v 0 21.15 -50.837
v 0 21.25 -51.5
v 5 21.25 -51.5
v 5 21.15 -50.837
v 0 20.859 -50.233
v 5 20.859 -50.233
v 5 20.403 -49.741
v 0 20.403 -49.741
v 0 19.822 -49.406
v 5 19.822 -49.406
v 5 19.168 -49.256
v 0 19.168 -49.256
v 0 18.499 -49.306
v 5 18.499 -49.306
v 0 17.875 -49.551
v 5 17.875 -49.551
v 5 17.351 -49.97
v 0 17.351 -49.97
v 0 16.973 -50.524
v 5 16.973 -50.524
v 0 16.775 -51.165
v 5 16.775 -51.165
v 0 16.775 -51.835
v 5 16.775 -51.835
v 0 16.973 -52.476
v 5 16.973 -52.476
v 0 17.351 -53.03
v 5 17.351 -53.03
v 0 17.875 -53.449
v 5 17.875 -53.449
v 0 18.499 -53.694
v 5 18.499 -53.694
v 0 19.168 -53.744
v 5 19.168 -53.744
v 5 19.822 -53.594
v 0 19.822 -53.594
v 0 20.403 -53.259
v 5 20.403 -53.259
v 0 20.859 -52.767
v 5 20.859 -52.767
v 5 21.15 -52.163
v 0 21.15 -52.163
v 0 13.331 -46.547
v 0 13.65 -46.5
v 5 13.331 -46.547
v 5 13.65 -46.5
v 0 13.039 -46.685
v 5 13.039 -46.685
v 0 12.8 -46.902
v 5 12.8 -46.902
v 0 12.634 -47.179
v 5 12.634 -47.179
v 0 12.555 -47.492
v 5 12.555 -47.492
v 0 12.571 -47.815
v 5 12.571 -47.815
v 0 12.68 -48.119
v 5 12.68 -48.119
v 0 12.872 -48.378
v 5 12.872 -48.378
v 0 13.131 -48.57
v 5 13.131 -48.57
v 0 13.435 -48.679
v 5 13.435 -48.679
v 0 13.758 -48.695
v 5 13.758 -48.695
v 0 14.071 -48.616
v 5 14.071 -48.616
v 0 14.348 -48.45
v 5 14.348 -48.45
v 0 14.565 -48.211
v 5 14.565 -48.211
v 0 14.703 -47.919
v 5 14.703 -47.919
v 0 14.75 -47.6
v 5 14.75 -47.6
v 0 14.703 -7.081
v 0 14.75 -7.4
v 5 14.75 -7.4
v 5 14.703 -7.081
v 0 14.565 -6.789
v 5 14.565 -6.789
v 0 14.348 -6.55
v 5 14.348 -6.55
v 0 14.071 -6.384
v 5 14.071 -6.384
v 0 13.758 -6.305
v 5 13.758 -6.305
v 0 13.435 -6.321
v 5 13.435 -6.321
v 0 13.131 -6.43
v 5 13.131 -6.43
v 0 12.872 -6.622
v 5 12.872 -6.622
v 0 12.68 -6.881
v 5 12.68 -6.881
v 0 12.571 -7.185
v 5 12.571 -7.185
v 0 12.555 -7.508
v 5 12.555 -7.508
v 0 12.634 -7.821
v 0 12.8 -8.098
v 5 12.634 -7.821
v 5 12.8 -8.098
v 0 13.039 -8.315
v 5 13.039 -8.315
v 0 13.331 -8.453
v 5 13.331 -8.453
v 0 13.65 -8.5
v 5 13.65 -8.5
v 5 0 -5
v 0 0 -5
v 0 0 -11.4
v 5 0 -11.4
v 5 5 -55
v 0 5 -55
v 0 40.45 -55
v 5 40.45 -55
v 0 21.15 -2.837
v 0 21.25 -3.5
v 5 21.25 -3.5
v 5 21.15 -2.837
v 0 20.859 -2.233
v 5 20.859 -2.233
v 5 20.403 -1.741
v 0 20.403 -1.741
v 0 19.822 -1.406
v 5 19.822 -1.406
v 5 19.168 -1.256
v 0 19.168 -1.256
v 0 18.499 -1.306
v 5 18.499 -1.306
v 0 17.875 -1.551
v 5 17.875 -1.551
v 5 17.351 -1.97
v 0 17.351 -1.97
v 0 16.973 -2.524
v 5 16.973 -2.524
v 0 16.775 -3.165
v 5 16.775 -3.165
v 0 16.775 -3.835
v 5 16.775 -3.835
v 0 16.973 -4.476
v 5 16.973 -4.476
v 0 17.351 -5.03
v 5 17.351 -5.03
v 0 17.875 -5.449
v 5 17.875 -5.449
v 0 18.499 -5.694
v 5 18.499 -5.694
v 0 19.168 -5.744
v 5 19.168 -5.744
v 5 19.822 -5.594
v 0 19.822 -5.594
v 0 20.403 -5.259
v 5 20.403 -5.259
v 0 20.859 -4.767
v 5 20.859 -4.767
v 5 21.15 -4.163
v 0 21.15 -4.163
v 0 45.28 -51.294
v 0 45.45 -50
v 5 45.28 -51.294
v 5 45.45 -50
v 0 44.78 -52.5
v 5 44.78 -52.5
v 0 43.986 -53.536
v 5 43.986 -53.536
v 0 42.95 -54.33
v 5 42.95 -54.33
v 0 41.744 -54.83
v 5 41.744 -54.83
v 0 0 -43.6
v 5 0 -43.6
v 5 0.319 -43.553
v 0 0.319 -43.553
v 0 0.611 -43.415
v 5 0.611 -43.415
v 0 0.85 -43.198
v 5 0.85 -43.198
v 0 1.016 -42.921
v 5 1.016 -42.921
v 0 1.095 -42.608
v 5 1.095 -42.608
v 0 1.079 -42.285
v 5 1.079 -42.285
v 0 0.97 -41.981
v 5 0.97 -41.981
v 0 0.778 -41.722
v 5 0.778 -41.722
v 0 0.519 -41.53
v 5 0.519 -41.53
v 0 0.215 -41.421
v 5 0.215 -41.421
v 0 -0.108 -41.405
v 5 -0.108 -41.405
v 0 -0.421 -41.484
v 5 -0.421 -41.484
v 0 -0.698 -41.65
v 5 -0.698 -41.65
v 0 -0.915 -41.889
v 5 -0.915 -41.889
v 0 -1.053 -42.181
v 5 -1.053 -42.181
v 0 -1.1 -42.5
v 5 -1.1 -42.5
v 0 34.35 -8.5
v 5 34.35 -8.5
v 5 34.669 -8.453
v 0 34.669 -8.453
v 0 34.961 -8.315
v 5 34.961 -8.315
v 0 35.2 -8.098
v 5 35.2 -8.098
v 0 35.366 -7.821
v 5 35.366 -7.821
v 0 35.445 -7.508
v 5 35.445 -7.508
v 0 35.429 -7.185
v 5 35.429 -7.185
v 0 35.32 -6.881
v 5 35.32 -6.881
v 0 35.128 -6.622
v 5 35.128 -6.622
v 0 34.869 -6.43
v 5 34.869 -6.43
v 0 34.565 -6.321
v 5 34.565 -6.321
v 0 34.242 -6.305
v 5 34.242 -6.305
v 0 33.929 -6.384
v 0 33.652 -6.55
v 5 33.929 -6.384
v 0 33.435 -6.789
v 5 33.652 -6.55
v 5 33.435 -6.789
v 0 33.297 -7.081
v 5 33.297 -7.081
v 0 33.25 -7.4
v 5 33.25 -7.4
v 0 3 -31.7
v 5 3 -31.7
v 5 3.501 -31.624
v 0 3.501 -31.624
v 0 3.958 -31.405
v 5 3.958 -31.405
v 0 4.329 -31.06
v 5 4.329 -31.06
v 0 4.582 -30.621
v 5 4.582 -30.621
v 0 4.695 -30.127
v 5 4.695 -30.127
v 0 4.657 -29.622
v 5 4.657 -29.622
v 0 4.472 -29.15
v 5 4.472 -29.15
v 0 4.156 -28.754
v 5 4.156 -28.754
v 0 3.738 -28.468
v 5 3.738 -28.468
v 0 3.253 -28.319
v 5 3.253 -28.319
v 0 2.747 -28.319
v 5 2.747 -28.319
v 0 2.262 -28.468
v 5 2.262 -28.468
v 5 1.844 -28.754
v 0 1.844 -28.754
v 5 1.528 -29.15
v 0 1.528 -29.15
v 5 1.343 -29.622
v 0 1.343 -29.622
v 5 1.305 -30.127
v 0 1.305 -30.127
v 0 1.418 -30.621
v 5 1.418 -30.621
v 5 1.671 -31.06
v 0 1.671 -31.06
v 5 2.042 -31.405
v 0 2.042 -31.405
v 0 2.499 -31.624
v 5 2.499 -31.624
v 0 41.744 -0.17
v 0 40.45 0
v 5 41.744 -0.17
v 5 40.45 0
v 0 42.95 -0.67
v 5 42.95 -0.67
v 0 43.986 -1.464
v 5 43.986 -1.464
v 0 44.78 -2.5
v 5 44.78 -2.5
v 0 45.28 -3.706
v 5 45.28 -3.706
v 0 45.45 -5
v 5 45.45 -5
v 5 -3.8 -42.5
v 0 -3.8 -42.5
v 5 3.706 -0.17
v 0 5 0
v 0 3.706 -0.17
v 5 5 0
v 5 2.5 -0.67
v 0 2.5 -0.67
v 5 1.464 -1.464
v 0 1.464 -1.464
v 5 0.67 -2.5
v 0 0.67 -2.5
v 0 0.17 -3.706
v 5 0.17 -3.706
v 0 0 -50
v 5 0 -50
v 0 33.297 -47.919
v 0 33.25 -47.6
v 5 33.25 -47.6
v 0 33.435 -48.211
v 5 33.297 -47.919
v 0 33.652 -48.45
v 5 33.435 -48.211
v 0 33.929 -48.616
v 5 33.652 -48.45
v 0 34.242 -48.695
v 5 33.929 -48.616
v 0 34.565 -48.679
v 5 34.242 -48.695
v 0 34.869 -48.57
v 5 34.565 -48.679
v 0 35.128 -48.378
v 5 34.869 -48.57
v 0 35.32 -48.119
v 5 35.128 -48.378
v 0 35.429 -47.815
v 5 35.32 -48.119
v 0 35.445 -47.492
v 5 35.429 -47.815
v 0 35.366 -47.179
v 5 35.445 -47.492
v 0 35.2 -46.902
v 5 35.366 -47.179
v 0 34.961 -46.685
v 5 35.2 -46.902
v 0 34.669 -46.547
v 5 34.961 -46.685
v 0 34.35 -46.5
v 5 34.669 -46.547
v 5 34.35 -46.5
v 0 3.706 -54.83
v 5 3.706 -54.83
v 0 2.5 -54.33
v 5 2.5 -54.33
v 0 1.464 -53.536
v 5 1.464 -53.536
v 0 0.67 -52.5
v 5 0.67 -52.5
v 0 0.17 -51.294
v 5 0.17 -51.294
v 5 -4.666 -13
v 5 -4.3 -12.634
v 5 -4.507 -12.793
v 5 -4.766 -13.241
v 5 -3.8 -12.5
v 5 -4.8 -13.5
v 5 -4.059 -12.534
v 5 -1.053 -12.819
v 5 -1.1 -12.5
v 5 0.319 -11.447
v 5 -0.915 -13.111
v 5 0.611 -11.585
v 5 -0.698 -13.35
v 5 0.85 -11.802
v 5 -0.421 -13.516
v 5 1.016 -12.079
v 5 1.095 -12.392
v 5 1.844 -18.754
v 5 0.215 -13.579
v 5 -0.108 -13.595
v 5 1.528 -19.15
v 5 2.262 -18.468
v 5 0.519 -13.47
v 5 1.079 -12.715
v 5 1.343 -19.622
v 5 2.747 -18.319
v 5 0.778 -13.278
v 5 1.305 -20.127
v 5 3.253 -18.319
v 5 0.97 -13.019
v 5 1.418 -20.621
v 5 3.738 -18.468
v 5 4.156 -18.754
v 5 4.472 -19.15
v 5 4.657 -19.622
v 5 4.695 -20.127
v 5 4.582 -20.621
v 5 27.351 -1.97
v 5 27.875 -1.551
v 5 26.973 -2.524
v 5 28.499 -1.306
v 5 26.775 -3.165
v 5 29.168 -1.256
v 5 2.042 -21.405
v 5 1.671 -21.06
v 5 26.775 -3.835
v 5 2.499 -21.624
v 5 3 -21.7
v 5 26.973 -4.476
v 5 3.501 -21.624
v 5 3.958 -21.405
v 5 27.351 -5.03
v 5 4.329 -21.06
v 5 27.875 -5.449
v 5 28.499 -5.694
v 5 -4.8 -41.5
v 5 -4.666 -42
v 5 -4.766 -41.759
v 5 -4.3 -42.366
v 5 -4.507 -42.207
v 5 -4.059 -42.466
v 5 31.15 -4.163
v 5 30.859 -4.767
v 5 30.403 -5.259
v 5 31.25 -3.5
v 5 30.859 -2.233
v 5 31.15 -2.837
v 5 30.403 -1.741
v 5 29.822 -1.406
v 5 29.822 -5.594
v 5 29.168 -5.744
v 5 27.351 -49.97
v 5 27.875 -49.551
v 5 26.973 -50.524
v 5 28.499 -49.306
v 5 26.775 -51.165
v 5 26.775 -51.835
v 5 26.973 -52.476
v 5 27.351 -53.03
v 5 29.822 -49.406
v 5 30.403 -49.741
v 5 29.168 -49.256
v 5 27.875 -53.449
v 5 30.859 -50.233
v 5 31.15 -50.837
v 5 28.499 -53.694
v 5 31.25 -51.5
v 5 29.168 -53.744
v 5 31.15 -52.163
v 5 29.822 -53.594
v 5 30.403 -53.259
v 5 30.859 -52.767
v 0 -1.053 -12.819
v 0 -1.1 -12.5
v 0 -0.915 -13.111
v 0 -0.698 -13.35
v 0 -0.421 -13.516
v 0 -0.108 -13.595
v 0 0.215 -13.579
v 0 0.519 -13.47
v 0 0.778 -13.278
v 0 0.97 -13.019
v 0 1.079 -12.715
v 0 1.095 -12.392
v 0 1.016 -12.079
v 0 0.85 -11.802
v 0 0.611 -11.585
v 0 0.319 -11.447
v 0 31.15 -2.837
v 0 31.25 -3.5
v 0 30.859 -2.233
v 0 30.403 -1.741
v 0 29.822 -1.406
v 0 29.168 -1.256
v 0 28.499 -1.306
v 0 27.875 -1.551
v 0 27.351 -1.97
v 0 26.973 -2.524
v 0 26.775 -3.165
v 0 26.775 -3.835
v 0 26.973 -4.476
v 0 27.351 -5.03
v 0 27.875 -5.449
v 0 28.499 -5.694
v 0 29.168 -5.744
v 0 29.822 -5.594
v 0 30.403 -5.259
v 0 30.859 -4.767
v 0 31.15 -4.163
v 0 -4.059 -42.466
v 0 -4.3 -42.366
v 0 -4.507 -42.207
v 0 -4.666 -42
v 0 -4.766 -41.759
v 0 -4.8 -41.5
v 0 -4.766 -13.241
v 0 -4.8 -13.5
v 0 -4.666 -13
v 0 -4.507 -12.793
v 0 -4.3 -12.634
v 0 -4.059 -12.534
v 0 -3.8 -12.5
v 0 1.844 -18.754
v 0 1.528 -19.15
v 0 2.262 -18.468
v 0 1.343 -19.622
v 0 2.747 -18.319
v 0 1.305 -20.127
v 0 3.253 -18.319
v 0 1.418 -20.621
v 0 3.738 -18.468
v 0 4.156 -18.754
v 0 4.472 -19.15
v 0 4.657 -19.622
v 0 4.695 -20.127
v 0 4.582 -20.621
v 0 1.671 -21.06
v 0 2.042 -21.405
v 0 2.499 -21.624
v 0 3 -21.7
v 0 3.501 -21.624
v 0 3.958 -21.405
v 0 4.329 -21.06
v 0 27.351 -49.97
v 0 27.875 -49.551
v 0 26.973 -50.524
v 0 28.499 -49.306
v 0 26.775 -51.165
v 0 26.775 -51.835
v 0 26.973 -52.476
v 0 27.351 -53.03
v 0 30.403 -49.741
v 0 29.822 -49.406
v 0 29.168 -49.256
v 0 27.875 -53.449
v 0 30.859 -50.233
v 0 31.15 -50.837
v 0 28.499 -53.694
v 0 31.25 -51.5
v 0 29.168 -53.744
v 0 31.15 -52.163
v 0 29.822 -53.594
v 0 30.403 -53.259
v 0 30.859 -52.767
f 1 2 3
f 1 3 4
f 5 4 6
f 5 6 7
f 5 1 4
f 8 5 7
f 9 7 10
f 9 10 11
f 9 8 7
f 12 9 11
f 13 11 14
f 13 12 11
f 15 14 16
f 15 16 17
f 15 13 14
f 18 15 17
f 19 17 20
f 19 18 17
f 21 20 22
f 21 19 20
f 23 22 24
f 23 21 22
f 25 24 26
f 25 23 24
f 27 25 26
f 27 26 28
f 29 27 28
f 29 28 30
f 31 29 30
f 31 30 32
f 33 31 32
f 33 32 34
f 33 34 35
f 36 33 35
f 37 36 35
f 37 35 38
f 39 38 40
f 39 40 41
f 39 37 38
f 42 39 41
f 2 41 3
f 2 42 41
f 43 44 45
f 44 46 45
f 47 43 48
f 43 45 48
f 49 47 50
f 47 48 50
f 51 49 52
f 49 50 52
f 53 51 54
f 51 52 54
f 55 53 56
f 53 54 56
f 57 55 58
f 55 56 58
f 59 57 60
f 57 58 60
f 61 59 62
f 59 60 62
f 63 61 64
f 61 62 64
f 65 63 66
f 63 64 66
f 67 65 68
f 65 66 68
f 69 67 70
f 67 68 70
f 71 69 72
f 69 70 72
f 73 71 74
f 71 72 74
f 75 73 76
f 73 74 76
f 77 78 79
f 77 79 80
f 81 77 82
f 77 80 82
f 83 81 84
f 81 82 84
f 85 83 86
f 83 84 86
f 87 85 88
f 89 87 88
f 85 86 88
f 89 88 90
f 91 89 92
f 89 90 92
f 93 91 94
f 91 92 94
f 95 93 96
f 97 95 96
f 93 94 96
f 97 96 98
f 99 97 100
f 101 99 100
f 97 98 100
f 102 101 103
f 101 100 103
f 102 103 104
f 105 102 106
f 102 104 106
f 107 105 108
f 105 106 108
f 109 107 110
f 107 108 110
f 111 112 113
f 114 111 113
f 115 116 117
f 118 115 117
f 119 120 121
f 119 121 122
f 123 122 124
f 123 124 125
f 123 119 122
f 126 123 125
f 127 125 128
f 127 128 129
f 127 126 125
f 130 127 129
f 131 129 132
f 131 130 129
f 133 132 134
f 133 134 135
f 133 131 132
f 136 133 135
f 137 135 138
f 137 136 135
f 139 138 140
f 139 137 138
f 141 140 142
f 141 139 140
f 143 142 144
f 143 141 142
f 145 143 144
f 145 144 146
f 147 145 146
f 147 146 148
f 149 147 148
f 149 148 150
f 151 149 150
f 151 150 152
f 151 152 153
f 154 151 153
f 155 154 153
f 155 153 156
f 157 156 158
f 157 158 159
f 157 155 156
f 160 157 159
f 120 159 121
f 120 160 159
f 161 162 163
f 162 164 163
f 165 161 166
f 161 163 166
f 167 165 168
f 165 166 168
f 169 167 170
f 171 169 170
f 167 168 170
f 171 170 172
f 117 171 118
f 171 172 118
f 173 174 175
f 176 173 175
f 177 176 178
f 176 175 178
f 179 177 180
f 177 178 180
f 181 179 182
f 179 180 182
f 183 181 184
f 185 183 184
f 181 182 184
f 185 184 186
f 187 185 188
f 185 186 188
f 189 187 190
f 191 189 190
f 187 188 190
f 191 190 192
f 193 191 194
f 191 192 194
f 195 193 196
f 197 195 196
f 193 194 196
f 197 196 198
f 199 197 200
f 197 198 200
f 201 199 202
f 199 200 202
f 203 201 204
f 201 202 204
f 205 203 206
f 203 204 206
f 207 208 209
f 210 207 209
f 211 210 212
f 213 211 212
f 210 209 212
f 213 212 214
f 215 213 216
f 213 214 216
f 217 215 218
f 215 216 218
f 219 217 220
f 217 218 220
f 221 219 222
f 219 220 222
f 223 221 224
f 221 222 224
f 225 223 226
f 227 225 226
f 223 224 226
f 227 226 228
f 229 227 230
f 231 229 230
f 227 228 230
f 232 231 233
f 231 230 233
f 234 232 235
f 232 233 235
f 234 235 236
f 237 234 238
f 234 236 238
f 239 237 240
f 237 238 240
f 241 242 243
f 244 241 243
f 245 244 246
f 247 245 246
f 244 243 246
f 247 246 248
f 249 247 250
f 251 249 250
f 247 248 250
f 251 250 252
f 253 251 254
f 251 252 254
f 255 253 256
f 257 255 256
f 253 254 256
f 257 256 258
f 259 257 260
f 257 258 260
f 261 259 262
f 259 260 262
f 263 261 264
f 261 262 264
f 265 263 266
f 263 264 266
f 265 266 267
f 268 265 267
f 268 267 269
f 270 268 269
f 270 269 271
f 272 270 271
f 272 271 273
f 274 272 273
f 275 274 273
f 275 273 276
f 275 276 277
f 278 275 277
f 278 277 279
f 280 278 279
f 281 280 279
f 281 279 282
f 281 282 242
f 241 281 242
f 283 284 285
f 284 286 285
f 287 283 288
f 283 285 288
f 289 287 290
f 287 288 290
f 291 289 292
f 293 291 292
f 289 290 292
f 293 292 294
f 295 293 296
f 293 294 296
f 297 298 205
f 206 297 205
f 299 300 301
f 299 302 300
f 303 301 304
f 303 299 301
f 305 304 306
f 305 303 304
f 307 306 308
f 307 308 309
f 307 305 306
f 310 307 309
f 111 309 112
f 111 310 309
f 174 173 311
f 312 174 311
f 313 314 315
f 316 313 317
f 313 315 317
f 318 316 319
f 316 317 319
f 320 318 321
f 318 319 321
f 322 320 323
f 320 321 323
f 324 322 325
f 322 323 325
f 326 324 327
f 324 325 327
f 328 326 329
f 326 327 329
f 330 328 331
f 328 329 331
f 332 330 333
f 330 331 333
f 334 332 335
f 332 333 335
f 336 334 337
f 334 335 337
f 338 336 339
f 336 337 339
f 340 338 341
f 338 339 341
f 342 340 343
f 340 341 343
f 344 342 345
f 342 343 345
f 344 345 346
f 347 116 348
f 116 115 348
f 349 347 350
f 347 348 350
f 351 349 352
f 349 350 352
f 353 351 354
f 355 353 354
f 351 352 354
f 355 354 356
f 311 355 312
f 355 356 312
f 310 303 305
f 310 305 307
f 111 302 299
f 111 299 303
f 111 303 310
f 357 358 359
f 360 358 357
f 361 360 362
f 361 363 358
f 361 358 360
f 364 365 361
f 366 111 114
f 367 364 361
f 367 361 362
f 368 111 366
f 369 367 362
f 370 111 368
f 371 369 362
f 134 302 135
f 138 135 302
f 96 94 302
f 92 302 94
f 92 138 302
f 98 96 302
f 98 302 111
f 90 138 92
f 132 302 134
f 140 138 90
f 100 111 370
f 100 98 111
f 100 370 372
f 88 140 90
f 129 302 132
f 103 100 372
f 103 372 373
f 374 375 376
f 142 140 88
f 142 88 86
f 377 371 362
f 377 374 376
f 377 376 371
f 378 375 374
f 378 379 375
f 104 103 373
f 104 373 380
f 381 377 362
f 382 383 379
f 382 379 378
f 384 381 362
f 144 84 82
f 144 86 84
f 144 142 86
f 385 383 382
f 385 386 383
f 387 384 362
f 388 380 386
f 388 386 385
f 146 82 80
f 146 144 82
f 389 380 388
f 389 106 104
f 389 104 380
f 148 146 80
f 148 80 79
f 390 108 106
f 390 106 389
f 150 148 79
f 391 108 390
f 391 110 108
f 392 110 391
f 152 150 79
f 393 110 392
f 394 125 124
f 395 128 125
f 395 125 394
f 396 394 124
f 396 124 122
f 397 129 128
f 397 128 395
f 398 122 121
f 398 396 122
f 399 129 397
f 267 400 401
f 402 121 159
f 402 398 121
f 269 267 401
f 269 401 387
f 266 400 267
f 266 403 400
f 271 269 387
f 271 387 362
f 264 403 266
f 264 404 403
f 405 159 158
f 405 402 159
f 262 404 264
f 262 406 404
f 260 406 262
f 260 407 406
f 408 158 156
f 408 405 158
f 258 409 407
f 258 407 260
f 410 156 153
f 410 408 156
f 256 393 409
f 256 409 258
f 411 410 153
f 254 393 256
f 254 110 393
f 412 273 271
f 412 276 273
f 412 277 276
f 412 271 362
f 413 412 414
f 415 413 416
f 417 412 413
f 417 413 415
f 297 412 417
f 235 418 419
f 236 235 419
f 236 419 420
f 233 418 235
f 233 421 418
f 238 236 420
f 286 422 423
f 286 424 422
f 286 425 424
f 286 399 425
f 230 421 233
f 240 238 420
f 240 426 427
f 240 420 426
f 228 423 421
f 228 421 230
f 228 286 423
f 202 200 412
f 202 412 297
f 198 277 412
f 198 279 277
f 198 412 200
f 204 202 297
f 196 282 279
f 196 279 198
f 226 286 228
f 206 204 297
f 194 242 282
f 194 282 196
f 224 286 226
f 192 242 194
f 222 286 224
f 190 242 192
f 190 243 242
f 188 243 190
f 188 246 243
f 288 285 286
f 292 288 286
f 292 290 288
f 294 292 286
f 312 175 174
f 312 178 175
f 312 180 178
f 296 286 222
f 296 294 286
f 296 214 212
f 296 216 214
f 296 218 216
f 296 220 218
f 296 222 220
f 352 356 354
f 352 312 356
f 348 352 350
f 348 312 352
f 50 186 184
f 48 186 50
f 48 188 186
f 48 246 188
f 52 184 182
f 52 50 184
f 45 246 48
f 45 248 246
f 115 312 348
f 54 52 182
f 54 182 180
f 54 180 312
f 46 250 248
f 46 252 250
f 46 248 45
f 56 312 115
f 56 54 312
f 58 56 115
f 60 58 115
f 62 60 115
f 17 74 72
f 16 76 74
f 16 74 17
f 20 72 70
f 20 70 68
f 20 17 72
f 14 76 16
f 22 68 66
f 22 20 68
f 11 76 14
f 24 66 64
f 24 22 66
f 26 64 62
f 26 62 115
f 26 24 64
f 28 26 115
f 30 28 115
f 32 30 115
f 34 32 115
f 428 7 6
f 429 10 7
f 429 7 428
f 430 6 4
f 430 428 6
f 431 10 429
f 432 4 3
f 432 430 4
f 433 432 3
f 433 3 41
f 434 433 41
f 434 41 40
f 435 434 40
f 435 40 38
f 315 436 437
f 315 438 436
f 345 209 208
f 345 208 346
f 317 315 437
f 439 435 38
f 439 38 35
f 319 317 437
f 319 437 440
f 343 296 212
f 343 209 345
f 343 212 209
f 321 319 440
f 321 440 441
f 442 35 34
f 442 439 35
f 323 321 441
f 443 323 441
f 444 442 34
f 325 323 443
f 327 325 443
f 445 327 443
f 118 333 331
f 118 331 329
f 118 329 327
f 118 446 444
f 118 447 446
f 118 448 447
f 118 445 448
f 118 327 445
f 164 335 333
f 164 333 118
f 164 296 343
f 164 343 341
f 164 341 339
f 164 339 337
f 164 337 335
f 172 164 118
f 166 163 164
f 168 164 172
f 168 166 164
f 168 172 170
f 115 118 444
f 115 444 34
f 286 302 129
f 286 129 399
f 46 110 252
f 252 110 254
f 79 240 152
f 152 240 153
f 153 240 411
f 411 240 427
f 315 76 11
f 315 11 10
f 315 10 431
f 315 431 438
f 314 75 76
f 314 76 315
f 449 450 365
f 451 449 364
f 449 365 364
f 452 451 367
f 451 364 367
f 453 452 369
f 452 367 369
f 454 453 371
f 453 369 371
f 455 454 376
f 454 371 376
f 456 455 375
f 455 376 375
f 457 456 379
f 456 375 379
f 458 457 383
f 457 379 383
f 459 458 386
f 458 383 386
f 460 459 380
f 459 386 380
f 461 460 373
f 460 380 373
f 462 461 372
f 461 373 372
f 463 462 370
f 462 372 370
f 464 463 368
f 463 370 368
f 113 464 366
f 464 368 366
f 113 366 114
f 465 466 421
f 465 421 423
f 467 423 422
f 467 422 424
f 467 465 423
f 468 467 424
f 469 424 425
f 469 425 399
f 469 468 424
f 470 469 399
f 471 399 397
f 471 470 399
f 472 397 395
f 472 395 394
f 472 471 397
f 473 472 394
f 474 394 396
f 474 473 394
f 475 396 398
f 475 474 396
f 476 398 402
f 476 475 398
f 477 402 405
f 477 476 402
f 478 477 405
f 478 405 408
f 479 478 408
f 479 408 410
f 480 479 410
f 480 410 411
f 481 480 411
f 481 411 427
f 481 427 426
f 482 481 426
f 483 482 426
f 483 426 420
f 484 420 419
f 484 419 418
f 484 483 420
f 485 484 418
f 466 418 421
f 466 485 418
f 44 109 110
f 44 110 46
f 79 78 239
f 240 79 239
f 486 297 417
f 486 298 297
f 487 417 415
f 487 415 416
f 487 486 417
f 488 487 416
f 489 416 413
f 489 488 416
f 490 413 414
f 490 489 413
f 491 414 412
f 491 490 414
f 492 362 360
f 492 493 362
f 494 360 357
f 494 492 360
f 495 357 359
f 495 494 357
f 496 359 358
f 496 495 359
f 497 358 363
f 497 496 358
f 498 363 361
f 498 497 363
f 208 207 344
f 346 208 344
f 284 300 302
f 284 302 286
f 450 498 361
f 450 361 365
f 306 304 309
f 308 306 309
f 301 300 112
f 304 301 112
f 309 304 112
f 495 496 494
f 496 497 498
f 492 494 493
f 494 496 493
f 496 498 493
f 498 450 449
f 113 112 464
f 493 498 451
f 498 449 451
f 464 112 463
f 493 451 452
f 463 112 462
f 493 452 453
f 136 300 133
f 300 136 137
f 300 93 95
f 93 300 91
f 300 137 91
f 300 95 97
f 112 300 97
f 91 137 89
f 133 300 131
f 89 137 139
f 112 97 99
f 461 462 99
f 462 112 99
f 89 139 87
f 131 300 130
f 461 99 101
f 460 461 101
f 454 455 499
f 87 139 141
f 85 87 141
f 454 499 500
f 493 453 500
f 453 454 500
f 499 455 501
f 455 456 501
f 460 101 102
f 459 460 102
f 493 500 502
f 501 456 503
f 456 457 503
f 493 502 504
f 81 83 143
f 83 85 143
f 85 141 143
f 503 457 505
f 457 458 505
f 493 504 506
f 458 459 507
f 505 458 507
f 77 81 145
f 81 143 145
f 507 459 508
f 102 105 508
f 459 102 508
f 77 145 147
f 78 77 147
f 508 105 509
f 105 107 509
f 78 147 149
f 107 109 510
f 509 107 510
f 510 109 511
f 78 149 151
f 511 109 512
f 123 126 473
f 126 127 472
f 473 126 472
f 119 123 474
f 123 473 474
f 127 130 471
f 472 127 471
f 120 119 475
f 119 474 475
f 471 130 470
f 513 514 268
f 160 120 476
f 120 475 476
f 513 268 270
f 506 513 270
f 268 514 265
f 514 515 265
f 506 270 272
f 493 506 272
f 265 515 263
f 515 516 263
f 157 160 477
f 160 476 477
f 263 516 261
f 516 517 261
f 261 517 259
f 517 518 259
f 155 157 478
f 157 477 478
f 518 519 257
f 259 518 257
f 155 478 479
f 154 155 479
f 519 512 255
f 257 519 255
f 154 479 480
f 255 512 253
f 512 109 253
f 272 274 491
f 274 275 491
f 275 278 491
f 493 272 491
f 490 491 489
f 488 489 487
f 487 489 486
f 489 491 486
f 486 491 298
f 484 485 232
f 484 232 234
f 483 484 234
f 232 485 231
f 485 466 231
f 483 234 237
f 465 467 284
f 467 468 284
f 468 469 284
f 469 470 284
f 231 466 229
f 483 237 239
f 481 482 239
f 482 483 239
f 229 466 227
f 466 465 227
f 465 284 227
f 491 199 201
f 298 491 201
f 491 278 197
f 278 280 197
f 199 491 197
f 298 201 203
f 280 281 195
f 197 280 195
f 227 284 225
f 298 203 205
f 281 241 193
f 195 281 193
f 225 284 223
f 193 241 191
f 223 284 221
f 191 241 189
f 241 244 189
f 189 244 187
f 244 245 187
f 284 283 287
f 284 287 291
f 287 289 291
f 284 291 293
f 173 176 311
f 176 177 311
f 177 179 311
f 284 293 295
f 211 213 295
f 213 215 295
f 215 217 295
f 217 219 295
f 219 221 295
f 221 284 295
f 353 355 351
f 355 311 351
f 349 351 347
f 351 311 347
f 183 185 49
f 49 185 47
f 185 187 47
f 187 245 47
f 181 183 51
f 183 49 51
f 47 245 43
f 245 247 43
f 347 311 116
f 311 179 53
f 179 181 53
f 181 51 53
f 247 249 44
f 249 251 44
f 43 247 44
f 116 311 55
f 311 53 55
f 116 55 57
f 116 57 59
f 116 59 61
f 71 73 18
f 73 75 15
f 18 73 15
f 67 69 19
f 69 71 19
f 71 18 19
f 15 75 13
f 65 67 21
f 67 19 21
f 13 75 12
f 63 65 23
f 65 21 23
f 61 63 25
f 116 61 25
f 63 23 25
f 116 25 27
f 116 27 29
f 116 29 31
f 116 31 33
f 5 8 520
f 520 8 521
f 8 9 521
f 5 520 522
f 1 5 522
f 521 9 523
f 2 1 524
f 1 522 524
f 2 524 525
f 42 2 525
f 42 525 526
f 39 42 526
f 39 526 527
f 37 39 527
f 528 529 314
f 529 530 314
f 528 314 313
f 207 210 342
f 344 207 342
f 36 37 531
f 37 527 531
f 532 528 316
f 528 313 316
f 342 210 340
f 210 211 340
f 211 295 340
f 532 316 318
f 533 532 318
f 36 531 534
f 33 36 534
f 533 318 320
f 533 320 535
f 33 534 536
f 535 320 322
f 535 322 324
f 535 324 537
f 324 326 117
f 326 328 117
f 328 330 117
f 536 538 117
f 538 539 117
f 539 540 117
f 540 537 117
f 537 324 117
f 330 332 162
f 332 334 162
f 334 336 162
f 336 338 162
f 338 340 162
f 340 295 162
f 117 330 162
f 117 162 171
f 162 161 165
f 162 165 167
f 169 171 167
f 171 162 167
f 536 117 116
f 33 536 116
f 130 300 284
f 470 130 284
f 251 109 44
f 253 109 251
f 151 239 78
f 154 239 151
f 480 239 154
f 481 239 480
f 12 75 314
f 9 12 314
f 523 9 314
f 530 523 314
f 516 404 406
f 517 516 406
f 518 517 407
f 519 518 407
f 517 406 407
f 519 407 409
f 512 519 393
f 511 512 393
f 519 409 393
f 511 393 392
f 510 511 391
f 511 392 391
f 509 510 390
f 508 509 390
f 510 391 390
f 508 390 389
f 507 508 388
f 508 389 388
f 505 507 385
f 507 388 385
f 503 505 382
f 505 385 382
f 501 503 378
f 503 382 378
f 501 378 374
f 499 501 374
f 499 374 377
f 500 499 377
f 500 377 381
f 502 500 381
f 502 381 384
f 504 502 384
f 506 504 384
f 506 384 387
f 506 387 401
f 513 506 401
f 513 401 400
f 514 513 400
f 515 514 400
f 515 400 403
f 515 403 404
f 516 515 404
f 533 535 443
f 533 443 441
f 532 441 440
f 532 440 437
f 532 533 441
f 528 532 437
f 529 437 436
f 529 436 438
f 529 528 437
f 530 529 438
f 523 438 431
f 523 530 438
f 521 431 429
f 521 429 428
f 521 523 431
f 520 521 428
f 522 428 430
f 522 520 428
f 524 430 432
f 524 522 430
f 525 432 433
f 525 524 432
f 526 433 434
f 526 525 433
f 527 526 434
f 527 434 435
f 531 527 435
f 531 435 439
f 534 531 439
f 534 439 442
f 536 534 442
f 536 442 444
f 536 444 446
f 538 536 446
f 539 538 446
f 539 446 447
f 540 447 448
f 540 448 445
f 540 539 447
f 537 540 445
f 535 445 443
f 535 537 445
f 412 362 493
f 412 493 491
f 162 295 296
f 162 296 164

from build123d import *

# Parameters (mm, degrees)
SKETCH_1_W                   = 55
SKETCH_1_H                   = 45.45
SKETCH_1_W_2                 = 40.2
SKETCH_1_H_2                 = 20.7
EXTRUDE_1_DEPTH              = 5
SKETCH_2_W                   = 30
SKETCH_2_H                   = 4.8
EXTRUDE_2_DEPTH              = 5
FILLET_1_R                   = 5
SKETCH_3_R                   = 1.1
CUT_EXTRUDE_1_DEPTH          = 5
FILLET_2_R                   = 1
HOLE_WIZARD_M3_1_D           = 3.4
M4_CLEARANCE_HOLE1_OUTLINE_R = 2.25
M4_CLEARANCE_HOLE1_DEPTH     = 5


# Read off the part's stored shape, not the designer's step: M4 Clearance Hole1
with BuildPart() as part:
    # 草图1 → 凸台-拉伸1 (new body)
    with BuildSketch(Plane(origin=(0, 0, 0), x_dir=(0, 0, -1), z_dir=(1, 0, 0))):
        with Locations((27.5, 22.725)):
            Rectangle(SKETCH_1_W, SKETCH_1_H)
        with Locations((27.5, 24)):
            Rectangle(SKETCH_1_W_2, SKETCH_1_H_2, mode=Mode.SUBTRACT)
    extrude(amount=EXTRUDE_1_DEPTH)

    # 草图2 → 凸台-拉伸2 (add)
    with BuildSketch(Plane(origin=(5, 0, 0), x_dir=(0, 0, -1), z_dir=(1, 0, 0))):
        with Locations((27.5, -2.4)):
            Rectangle(SKETCH_2_W, SKETCH_2_H)
    extrude(amount=-EXTRUDE_2_DEPTH)

    # 圆角1
    fillet_1_edges = [part.edges().sort_by_distance(p)[0] for p in [
        (2.5, 45.45, 0),
        (2.5, 45.45, -55),
        (2.5, 0, -55),
        (2.5, 0, 0),
    ]]
    fillet(fillet_1_edges, radius=FILLET_1_R)

    # 草图3 → 切除-拉伸1 (cut)
    with BuildSketch(Plane(origin=(5, 0, 0), x_dir=(0, 0, -1), z_dir=(1, 0, 0))):
        with Locations((12.5, 0)):
            Circle(SKETCH_3_R)
        with Locations((42.5, 0)):
            Circle(SKETCH_3_R)
        with Locations((7.4, 13.65)):
            Circle(SKETCH_3_R)
        with Locations((7.4, 34.35)):
            Circle(SKETCH_3_R)
        with Locations((47.6, 34.35)):
            Circle(SKETCH_3_R)
        with Locations((47.6, 13.65)):
            Circle(SKETCH_3_R)
    extrude(amount=-CUT_EXTRUDE_1_DEPTH, mode=Mode.SUBTRACT)

    # 圆角2
    fillet_2_edges = [part.edges().sort_by_distance(p)[0] for p in [
        (2.5, -4.8, -42.5),
        (2.5, -4.8, -12.5),
    ]]
    fillet(fillet_2_edges, radius=FILLET_2_R)

    # M3 间隙孔1 (through all)
    with Locations(Plane.ZY):
        with Locations((-20, 3), (-30, 3)):
            Hole(HOLE_WIZARD_M3_1_D / 2)

    # M4 Clearance Hole1 outline → M4 Clearance Hole1 (cut)
    with BuildSketch(Plane.YZ):
        with Locations((29, -3.5)):
            Circle(M4_CLEARANCE_HOLE1_OUTLINE_R)
        with Locations((19, -51.5)):
            Circle(M4_CLEARANCE_HOLE1_OUTLINE_R)
        with Locations((19, -3.5)):
            Circle(M4_CLEARANCE_HOLE1_OUTLINE_R)
        with Locations((29, -51.5)):
            Circle(M4_CLEARANCE_HOLE1_OUTLINE_R)
    extrude(amount=M4_CLEARANCE_HOLE1_DEPTH, mode=Mode.SUBTRACT)


solid = part.part
